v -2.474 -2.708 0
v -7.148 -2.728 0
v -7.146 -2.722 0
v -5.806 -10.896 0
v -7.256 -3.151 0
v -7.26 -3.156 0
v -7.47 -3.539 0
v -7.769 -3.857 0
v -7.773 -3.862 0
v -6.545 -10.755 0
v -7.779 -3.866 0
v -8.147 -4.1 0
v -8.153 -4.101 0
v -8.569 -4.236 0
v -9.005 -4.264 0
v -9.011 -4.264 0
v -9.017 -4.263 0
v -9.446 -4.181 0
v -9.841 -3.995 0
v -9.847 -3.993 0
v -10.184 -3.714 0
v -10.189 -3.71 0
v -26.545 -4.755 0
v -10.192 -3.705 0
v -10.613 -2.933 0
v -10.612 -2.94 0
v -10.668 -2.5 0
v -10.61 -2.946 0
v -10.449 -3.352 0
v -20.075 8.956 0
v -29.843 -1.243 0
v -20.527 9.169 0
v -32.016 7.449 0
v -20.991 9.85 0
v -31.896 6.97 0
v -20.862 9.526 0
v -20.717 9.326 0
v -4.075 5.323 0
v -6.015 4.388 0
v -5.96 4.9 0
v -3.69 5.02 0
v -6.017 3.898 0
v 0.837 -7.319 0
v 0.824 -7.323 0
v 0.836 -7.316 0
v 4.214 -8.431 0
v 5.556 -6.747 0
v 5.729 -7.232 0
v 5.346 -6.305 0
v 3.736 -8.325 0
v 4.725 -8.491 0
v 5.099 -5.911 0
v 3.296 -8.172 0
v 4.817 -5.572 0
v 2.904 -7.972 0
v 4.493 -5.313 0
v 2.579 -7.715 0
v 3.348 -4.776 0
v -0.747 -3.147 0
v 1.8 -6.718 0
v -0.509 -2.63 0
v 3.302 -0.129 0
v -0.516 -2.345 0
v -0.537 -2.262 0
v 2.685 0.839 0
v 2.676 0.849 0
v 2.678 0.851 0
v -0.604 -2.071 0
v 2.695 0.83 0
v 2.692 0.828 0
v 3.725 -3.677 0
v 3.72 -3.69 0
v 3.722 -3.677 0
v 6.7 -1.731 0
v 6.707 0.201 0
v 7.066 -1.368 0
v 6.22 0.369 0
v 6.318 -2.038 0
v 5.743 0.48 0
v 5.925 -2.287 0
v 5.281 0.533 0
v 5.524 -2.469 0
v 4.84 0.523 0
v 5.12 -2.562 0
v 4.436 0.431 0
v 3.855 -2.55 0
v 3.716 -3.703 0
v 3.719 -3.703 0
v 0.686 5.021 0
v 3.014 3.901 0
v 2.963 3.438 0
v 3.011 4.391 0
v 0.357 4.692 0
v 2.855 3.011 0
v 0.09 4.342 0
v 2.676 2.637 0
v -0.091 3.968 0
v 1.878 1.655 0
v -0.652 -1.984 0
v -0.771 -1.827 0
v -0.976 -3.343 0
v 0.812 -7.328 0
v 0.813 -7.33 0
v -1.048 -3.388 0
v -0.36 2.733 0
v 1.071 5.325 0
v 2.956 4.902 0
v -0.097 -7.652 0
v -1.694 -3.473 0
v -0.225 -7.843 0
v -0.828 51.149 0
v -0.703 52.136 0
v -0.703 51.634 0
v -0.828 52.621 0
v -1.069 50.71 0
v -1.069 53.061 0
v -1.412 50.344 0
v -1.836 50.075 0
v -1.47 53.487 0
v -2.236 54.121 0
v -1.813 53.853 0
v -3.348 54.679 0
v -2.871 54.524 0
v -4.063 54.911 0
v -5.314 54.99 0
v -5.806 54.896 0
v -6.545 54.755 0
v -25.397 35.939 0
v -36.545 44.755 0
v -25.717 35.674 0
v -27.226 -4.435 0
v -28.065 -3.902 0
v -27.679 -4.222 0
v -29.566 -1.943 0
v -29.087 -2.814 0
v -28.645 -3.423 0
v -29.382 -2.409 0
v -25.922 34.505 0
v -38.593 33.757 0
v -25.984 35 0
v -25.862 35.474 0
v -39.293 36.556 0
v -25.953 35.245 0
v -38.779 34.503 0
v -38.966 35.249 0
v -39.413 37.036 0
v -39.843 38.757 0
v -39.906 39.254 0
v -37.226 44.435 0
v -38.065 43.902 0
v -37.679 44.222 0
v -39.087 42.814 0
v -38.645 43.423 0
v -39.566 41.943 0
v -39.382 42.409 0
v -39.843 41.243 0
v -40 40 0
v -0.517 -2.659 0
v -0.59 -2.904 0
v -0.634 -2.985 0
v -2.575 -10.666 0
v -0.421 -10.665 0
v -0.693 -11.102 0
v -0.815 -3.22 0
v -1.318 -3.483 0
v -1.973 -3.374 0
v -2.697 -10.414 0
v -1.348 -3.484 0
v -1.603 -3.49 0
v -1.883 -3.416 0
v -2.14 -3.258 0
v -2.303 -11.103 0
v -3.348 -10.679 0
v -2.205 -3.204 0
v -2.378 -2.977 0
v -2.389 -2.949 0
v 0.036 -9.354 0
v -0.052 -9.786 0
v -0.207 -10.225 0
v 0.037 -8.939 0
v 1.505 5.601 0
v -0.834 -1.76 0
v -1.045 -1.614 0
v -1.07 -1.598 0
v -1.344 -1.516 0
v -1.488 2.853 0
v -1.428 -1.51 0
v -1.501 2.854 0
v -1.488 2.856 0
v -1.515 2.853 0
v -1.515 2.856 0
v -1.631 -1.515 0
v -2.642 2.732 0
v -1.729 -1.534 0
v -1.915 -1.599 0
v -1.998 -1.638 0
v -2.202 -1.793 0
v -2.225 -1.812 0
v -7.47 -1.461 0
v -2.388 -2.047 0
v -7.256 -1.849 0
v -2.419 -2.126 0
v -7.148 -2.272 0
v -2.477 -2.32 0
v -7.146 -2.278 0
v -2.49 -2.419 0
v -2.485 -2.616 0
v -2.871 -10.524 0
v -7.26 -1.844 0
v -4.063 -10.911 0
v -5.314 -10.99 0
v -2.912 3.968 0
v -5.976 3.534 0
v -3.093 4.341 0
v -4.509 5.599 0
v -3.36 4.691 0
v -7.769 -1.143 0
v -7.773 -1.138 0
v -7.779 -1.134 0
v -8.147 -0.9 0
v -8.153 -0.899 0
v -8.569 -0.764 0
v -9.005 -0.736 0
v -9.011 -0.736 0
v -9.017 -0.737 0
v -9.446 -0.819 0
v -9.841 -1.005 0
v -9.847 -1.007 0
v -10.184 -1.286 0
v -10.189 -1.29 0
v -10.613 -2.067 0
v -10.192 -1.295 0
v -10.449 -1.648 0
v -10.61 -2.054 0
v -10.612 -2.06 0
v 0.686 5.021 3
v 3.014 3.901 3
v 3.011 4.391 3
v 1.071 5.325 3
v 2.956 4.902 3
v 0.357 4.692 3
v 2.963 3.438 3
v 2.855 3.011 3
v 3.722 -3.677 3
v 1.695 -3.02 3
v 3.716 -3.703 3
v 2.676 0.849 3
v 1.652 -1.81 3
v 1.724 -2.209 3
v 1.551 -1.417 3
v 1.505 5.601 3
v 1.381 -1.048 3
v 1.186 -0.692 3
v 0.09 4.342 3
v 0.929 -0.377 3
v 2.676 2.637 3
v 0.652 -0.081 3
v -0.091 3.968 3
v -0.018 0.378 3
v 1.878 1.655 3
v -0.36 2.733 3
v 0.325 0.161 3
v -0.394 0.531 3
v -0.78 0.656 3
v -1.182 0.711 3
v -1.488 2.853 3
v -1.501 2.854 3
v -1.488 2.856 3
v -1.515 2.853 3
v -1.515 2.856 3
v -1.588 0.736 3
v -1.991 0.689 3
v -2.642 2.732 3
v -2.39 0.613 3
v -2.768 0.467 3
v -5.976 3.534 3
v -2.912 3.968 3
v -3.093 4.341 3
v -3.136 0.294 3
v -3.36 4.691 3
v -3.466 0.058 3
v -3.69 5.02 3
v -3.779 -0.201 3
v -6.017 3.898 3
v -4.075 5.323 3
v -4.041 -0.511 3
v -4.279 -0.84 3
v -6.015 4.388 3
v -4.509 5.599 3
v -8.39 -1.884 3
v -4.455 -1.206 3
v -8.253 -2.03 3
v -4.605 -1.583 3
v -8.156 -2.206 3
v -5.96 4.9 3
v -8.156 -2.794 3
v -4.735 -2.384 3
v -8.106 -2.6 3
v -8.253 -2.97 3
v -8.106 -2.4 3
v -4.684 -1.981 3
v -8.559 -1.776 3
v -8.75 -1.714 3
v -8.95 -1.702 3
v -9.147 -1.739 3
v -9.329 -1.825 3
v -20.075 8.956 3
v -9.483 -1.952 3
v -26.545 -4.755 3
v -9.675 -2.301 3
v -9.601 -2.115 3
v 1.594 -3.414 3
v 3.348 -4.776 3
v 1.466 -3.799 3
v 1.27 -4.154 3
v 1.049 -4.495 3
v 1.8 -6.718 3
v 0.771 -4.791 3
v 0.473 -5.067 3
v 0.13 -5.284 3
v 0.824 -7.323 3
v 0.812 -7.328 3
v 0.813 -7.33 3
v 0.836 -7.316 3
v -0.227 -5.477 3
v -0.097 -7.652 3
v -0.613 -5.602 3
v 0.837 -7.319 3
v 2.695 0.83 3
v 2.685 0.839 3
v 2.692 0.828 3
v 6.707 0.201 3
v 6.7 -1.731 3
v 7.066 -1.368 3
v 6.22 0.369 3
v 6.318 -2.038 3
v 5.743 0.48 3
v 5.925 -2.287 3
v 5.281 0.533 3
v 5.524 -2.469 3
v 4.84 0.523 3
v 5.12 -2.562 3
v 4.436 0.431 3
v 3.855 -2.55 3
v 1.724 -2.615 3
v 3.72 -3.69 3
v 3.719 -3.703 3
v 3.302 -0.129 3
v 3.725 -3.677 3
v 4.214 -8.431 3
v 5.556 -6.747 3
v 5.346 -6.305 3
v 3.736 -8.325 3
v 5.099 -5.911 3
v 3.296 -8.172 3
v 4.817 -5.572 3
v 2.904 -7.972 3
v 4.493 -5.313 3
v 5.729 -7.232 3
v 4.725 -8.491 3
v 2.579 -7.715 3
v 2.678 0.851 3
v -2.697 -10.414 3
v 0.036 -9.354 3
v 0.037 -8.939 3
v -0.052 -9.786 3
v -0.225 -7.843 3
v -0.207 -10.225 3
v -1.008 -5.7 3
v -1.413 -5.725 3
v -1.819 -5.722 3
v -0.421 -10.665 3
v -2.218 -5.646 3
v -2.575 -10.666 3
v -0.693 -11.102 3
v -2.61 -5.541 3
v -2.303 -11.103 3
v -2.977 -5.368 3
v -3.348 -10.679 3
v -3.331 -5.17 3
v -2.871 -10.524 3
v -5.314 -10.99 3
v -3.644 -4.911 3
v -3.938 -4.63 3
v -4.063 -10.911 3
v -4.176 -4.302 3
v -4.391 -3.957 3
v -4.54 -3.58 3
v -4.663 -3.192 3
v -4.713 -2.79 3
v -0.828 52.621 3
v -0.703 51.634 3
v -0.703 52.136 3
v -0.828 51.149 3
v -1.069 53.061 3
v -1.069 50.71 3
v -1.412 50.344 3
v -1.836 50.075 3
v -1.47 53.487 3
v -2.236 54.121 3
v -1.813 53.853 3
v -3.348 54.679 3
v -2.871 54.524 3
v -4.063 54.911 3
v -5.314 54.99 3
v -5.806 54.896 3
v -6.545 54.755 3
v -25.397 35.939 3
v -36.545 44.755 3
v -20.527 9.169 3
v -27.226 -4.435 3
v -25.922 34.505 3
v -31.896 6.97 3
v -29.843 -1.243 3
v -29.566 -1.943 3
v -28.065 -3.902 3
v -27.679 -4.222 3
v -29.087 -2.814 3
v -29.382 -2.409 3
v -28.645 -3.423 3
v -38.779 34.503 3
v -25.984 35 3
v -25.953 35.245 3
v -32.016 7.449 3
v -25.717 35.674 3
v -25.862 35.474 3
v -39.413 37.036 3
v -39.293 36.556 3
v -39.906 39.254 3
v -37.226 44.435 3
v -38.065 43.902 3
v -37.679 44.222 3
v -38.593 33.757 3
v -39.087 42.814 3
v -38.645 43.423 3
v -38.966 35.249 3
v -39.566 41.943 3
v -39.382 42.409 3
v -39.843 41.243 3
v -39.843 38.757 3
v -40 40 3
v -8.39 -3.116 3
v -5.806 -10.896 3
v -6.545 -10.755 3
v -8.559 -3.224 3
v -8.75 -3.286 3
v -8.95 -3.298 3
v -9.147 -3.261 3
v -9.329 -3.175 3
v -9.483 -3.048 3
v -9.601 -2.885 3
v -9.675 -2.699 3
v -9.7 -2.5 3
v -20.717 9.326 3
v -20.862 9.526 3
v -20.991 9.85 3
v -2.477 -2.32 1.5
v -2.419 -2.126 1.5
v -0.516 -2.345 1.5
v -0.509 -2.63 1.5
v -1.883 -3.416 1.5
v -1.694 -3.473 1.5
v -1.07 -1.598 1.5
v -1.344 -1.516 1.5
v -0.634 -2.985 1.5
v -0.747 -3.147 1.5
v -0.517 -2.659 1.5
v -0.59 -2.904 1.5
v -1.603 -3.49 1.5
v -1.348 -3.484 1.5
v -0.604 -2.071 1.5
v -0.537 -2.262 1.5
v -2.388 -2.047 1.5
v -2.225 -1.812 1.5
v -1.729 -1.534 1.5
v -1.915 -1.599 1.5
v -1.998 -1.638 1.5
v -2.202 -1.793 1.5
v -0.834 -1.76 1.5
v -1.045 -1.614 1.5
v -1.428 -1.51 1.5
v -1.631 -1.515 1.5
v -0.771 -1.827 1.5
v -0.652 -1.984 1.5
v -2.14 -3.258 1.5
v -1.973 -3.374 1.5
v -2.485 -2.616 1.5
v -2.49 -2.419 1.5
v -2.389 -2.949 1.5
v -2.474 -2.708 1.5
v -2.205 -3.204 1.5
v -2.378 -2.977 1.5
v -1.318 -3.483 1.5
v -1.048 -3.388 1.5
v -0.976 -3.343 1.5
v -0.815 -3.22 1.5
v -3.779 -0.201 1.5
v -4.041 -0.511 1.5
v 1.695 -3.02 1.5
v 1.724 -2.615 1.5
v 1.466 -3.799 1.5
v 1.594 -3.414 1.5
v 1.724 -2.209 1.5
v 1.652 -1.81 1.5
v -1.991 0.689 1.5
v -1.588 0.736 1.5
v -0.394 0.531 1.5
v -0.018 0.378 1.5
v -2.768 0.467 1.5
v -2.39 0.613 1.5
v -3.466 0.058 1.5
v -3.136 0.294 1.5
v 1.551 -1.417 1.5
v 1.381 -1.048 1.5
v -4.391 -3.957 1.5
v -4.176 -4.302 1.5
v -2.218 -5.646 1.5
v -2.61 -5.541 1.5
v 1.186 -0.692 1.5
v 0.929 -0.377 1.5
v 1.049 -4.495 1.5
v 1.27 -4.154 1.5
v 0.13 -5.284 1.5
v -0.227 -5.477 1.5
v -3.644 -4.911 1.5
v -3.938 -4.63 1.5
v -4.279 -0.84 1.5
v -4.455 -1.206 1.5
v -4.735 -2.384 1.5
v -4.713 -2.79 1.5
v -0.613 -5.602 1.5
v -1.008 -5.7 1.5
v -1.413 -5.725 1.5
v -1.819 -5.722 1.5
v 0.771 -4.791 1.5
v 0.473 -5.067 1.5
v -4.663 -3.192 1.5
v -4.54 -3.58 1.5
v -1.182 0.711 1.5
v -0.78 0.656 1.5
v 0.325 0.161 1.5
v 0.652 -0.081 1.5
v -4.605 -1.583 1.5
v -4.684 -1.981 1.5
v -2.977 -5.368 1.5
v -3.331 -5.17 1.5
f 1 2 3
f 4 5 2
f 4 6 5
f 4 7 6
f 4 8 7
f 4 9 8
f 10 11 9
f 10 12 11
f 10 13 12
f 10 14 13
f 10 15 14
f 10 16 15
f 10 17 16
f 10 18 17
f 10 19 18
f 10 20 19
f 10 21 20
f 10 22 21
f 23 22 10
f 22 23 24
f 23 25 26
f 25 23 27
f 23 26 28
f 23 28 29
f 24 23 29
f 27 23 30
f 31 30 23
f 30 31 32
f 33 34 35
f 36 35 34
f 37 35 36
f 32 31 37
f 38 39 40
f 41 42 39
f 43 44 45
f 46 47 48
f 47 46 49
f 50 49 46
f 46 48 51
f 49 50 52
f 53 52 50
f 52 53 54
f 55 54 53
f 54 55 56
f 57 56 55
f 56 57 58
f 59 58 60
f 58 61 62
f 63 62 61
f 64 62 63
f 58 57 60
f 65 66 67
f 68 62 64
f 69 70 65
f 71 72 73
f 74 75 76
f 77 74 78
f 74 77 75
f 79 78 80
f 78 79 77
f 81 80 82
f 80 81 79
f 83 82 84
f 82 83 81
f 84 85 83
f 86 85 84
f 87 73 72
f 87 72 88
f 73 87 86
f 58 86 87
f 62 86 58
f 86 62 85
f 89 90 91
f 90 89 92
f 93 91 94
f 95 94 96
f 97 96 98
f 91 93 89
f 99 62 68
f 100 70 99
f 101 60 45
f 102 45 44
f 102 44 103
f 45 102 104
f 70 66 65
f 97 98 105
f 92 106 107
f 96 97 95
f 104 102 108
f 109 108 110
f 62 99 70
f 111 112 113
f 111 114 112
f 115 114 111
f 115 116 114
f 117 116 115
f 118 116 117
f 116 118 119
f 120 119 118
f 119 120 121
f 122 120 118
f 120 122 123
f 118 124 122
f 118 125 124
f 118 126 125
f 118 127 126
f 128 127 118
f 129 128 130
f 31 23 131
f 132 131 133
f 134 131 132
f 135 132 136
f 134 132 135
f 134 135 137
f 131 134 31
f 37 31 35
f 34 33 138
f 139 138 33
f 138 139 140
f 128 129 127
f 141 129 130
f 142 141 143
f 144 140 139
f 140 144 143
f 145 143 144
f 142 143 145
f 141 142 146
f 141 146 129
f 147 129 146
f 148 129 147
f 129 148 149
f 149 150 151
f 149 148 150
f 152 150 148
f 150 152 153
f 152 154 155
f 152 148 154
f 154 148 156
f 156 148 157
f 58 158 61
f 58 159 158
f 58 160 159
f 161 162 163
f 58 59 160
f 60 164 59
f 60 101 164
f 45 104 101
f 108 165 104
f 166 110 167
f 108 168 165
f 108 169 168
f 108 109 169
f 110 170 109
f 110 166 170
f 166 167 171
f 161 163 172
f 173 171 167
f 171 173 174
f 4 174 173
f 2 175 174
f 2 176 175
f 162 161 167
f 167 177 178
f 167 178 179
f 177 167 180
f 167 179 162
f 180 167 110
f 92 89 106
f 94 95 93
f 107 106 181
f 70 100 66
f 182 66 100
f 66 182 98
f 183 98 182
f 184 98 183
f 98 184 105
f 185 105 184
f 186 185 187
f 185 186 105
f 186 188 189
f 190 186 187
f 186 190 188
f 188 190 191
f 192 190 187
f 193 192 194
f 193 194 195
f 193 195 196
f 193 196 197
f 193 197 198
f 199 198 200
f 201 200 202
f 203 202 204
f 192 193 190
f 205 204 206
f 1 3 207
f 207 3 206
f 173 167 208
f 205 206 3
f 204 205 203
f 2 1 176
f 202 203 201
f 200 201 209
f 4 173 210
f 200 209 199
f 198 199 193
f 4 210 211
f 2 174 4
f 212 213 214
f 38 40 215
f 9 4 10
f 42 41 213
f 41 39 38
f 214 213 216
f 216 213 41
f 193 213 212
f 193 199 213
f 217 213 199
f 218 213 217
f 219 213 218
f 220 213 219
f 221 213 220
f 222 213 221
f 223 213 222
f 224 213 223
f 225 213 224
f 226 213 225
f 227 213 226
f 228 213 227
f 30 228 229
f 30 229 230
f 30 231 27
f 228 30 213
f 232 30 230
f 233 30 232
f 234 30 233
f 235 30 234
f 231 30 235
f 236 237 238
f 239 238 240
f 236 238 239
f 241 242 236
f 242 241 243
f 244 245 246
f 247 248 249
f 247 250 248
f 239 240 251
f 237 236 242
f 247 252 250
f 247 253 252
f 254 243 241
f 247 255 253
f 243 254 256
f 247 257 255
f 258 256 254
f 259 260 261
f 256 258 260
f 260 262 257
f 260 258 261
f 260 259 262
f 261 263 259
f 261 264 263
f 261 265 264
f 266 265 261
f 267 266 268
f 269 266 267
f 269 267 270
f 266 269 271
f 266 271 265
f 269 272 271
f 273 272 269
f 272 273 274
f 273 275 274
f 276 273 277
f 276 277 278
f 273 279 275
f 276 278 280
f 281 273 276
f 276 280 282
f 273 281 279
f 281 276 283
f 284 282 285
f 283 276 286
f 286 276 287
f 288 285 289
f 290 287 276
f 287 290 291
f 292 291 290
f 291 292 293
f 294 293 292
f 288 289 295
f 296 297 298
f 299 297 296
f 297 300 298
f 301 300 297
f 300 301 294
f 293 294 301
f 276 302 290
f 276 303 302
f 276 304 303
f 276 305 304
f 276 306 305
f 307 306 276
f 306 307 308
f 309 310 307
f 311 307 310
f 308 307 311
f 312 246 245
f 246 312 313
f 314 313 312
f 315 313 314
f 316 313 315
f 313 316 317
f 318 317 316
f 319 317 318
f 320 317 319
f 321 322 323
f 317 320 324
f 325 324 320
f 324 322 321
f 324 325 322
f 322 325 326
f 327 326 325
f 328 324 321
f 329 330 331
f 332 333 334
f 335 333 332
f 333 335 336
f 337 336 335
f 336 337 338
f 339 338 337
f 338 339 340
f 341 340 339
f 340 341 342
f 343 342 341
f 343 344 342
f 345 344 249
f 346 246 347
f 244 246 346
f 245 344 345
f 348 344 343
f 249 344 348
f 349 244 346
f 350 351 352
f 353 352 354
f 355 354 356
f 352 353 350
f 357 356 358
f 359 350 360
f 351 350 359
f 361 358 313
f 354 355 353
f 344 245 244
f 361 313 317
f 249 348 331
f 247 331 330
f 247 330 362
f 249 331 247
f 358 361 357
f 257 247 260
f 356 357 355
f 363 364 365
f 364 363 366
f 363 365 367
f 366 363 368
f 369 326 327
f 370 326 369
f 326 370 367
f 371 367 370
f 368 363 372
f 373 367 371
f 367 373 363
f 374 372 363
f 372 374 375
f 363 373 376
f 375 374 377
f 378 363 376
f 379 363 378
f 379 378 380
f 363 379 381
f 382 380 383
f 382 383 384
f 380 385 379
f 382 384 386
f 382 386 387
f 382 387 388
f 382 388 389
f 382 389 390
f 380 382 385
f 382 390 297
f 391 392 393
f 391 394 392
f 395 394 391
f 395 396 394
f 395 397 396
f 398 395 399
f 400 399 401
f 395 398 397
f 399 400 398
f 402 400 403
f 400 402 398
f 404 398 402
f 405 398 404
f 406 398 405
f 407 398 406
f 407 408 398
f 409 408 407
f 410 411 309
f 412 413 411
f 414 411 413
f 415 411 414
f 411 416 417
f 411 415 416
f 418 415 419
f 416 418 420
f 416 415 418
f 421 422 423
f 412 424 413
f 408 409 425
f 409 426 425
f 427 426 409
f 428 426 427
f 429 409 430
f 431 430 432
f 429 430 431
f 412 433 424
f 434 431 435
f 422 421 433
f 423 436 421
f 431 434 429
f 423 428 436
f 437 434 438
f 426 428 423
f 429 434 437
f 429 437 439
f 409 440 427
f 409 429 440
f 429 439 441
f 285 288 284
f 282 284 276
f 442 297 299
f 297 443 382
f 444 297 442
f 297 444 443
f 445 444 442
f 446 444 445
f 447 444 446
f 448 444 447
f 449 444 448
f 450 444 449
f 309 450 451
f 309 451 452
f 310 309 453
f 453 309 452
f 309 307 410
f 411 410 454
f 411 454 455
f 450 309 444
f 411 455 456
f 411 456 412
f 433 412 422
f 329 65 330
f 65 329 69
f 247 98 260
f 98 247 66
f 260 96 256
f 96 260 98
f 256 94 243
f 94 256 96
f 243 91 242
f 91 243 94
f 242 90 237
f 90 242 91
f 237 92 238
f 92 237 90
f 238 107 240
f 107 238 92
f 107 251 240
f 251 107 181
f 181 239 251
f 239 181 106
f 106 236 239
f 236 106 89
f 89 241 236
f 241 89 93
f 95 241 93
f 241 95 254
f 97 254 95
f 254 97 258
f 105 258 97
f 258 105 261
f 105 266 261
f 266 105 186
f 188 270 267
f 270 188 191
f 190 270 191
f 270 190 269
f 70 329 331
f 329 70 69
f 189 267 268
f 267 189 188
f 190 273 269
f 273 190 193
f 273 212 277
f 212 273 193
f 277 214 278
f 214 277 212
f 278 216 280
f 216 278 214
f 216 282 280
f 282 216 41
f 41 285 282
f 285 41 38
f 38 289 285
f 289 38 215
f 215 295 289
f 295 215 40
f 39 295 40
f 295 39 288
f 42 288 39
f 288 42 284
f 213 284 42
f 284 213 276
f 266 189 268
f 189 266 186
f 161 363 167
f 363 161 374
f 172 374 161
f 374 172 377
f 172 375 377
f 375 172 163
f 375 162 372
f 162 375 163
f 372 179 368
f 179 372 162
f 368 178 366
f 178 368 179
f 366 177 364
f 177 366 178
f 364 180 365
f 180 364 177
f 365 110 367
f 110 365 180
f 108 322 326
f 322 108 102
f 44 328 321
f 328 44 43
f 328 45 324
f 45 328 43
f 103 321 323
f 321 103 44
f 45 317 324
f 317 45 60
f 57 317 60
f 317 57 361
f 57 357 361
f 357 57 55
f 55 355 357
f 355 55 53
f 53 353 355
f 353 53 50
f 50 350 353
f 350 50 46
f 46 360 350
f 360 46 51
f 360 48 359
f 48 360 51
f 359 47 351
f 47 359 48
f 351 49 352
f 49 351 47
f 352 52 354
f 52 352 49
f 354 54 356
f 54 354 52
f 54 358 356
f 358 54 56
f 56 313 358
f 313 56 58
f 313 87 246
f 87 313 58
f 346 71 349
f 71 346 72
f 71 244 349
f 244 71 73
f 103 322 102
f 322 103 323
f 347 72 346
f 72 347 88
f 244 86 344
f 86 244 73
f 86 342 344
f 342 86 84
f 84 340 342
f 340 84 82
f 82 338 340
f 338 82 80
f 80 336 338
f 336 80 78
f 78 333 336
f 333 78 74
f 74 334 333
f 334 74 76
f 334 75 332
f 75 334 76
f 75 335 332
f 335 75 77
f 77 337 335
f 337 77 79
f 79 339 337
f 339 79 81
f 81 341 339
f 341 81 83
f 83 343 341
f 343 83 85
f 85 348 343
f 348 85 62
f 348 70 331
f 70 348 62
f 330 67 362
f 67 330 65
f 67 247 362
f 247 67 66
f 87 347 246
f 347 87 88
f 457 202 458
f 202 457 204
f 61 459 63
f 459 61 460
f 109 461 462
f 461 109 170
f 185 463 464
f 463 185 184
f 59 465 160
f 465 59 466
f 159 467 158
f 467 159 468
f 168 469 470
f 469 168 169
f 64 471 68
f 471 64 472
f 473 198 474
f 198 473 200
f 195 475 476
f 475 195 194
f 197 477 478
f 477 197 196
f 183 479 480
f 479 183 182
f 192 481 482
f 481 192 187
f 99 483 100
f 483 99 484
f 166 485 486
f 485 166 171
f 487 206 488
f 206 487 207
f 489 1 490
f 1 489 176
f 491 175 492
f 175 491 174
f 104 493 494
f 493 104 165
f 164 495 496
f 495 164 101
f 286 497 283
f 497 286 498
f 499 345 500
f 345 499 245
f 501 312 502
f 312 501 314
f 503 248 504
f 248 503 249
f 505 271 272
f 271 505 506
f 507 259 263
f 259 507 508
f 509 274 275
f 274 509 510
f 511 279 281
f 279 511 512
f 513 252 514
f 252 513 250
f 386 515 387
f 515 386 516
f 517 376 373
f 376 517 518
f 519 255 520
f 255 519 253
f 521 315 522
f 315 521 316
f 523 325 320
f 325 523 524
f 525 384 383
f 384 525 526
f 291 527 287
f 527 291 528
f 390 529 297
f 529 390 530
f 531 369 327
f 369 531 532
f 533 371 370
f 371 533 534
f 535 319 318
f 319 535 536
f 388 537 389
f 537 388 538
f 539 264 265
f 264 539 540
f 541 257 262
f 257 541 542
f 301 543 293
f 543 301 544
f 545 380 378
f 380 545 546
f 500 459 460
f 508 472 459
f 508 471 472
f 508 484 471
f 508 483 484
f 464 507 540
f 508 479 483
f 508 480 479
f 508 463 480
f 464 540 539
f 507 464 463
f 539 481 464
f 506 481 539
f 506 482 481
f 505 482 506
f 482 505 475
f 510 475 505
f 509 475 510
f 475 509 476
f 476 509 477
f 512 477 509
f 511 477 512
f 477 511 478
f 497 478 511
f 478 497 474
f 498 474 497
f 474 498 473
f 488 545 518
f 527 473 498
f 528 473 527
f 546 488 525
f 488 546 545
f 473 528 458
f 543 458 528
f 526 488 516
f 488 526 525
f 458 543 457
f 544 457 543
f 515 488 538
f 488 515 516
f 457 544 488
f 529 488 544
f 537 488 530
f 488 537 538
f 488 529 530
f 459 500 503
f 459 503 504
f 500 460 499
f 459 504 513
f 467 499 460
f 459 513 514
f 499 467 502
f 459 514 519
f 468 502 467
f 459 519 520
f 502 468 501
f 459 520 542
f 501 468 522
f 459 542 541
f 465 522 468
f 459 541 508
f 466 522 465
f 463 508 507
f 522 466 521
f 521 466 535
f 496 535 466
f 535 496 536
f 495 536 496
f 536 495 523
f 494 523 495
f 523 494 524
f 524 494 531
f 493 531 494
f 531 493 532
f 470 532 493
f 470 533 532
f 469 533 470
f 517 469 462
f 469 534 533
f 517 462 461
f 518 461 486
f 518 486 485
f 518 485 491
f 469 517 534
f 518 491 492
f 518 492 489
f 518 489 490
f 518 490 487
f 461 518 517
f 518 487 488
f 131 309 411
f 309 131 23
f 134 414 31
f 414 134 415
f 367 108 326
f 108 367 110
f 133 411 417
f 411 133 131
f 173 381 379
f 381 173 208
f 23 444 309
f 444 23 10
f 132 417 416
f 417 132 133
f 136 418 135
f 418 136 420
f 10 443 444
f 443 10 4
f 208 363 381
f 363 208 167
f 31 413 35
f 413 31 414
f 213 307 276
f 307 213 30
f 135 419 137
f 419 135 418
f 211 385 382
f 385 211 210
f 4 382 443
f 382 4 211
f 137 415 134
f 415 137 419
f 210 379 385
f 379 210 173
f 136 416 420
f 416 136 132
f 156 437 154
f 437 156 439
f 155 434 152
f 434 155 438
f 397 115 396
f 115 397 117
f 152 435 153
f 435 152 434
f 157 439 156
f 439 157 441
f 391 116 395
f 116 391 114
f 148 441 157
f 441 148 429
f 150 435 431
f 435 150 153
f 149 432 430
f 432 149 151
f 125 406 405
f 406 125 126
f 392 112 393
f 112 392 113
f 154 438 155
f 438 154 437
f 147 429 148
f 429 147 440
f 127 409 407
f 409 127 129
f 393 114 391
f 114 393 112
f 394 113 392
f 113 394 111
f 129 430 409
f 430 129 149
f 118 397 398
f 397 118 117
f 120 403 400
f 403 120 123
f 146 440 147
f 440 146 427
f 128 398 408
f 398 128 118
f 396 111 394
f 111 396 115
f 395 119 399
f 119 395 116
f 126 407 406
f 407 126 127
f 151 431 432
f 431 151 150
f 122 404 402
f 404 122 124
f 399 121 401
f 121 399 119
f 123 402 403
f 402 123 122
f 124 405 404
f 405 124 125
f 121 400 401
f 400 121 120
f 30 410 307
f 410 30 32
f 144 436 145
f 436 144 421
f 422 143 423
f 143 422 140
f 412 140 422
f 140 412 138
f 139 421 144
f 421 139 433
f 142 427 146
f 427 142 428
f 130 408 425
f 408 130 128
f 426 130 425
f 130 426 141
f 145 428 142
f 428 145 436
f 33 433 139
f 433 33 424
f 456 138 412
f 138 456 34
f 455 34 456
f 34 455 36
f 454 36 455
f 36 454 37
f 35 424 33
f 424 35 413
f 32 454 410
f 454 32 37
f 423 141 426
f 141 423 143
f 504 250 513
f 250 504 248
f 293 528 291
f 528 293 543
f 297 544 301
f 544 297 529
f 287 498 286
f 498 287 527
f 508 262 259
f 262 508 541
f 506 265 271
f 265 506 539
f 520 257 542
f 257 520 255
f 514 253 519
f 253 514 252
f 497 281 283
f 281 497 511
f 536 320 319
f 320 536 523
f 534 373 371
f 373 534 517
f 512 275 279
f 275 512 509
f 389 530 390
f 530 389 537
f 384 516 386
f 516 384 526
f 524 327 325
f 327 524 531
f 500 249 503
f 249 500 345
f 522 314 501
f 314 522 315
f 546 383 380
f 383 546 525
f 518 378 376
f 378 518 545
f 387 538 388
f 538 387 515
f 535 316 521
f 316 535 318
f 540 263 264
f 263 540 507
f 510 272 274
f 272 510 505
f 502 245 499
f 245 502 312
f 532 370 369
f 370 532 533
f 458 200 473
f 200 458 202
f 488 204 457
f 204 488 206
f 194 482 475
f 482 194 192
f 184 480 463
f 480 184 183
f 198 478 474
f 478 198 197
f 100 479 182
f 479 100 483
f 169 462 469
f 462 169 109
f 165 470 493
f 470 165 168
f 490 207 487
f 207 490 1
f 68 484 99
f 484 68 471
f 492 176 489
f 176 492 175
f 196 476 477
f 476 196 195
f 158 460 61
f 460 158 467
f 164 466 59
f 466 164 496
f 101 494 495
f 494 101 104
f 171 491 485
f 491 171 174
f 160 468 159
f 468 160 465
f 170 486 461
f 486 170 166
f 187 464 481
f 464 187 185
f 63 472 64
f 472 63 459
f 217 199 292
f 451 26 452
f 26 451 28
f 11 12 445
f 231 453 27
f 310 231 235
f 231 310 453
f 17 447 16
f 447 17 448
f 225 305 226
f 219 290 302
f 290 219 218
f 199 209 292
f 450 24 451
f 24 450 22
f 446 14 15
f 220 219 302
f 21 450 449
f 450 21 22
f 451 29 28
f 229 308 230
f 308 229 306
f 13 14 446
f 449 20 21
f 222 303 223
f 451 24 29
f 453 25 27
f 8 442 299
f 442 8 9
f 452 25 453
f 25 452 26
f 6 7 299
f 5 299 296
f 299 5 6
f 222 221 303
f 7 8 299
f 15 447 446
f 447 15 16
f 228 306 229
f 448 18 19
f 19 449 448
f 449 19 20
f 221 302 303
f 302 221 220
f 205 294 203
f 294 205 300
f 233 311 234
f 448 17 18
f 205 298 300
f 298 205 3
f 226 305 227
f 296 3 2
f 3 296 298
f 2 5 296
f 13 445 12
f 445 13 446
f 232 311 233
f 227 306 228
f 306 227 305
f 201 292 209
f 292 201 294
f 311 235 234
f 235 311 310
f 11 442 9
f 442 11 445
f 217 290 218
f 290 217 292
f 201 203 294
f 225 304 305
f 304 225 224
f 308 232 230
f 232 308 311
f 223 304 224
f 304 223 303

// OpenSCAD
//ROBOTIC CLAW
//pincer attached to servo
//JGH 17/12/2013

$fn=25;
height=1.5;

use <claw_gear_servo.scad>;

//intersection(){
clw();
//translate([-20, -20])
//7cube([30,30,30]);
//}

module clw(){


translate([0,0,3])	//Orient for printing
rotate([0,180,0])

//GEAR	
	union(){
		translate([1.5,-2.5,3])
		rotate([0,0,25.7])
		rotate ([0,180,0])
		translate([0,0,1.5])
	
		difference(){
			gear();
			translate([-8,-2,-3])
			cylinder (r=6.5/2, h=5, $fn=50);

		//SAME HOLES AS IN pincer
		color([0,0,1])
		cylinder (r=6.5/2, h=1.5);
		}
	}




translate([0,0,3])	//Orient for printing
rotate([0,180,0])
		
//PINCER
difference(){
		
		minkowski(){		//everything inside the Minkoski is double the height (I have no idea why)
							//to fix this I set the variable height=1.5 (it should be 3)
			difference(){
				color([0,0,1])
				hull(){
					translate([1, 0, 0])
					cylinder(r=3, h=height);
		
					translate([5, -6, 0])
					cylinder(r=3, h=height);
					
					translate([25, 0, 0])
					cylinder(r=3, h=height);
					
					translate([35, 40, 0])
					cylinder(r=3, h=height);
					
					translate([5, 50, 0])
					cylinder(r=3, h=height);
				}
				
				hull(){
					translate([-6, 0, 0])
					cylinder(r=3, h=height);
					
					translate([20, 10, 0])
					cylinder(r=3, h=height);
					
					translate([25, 35, 0])
					cylinder(r=3, h=height);
					
					translate([0, 50, 0])
					cylinder(r=3, h=height);
				}
			
			}
		
			cylinder(r=2, h=height);
		
		}

	//SAME HOLES AS IN GEAR
	translate([1.5,-2.5,0]){
	color([0,0,1])
	cylinder (r=6.5/2, h=1.5);
	cylinder (r=1, h=10);

	translate([-1+1.5+13.8/2,0,0])
	color([1,0,0])
	cylinder(r1=0.8, r2=1.8, h=3.1);
	
	}
}

}
